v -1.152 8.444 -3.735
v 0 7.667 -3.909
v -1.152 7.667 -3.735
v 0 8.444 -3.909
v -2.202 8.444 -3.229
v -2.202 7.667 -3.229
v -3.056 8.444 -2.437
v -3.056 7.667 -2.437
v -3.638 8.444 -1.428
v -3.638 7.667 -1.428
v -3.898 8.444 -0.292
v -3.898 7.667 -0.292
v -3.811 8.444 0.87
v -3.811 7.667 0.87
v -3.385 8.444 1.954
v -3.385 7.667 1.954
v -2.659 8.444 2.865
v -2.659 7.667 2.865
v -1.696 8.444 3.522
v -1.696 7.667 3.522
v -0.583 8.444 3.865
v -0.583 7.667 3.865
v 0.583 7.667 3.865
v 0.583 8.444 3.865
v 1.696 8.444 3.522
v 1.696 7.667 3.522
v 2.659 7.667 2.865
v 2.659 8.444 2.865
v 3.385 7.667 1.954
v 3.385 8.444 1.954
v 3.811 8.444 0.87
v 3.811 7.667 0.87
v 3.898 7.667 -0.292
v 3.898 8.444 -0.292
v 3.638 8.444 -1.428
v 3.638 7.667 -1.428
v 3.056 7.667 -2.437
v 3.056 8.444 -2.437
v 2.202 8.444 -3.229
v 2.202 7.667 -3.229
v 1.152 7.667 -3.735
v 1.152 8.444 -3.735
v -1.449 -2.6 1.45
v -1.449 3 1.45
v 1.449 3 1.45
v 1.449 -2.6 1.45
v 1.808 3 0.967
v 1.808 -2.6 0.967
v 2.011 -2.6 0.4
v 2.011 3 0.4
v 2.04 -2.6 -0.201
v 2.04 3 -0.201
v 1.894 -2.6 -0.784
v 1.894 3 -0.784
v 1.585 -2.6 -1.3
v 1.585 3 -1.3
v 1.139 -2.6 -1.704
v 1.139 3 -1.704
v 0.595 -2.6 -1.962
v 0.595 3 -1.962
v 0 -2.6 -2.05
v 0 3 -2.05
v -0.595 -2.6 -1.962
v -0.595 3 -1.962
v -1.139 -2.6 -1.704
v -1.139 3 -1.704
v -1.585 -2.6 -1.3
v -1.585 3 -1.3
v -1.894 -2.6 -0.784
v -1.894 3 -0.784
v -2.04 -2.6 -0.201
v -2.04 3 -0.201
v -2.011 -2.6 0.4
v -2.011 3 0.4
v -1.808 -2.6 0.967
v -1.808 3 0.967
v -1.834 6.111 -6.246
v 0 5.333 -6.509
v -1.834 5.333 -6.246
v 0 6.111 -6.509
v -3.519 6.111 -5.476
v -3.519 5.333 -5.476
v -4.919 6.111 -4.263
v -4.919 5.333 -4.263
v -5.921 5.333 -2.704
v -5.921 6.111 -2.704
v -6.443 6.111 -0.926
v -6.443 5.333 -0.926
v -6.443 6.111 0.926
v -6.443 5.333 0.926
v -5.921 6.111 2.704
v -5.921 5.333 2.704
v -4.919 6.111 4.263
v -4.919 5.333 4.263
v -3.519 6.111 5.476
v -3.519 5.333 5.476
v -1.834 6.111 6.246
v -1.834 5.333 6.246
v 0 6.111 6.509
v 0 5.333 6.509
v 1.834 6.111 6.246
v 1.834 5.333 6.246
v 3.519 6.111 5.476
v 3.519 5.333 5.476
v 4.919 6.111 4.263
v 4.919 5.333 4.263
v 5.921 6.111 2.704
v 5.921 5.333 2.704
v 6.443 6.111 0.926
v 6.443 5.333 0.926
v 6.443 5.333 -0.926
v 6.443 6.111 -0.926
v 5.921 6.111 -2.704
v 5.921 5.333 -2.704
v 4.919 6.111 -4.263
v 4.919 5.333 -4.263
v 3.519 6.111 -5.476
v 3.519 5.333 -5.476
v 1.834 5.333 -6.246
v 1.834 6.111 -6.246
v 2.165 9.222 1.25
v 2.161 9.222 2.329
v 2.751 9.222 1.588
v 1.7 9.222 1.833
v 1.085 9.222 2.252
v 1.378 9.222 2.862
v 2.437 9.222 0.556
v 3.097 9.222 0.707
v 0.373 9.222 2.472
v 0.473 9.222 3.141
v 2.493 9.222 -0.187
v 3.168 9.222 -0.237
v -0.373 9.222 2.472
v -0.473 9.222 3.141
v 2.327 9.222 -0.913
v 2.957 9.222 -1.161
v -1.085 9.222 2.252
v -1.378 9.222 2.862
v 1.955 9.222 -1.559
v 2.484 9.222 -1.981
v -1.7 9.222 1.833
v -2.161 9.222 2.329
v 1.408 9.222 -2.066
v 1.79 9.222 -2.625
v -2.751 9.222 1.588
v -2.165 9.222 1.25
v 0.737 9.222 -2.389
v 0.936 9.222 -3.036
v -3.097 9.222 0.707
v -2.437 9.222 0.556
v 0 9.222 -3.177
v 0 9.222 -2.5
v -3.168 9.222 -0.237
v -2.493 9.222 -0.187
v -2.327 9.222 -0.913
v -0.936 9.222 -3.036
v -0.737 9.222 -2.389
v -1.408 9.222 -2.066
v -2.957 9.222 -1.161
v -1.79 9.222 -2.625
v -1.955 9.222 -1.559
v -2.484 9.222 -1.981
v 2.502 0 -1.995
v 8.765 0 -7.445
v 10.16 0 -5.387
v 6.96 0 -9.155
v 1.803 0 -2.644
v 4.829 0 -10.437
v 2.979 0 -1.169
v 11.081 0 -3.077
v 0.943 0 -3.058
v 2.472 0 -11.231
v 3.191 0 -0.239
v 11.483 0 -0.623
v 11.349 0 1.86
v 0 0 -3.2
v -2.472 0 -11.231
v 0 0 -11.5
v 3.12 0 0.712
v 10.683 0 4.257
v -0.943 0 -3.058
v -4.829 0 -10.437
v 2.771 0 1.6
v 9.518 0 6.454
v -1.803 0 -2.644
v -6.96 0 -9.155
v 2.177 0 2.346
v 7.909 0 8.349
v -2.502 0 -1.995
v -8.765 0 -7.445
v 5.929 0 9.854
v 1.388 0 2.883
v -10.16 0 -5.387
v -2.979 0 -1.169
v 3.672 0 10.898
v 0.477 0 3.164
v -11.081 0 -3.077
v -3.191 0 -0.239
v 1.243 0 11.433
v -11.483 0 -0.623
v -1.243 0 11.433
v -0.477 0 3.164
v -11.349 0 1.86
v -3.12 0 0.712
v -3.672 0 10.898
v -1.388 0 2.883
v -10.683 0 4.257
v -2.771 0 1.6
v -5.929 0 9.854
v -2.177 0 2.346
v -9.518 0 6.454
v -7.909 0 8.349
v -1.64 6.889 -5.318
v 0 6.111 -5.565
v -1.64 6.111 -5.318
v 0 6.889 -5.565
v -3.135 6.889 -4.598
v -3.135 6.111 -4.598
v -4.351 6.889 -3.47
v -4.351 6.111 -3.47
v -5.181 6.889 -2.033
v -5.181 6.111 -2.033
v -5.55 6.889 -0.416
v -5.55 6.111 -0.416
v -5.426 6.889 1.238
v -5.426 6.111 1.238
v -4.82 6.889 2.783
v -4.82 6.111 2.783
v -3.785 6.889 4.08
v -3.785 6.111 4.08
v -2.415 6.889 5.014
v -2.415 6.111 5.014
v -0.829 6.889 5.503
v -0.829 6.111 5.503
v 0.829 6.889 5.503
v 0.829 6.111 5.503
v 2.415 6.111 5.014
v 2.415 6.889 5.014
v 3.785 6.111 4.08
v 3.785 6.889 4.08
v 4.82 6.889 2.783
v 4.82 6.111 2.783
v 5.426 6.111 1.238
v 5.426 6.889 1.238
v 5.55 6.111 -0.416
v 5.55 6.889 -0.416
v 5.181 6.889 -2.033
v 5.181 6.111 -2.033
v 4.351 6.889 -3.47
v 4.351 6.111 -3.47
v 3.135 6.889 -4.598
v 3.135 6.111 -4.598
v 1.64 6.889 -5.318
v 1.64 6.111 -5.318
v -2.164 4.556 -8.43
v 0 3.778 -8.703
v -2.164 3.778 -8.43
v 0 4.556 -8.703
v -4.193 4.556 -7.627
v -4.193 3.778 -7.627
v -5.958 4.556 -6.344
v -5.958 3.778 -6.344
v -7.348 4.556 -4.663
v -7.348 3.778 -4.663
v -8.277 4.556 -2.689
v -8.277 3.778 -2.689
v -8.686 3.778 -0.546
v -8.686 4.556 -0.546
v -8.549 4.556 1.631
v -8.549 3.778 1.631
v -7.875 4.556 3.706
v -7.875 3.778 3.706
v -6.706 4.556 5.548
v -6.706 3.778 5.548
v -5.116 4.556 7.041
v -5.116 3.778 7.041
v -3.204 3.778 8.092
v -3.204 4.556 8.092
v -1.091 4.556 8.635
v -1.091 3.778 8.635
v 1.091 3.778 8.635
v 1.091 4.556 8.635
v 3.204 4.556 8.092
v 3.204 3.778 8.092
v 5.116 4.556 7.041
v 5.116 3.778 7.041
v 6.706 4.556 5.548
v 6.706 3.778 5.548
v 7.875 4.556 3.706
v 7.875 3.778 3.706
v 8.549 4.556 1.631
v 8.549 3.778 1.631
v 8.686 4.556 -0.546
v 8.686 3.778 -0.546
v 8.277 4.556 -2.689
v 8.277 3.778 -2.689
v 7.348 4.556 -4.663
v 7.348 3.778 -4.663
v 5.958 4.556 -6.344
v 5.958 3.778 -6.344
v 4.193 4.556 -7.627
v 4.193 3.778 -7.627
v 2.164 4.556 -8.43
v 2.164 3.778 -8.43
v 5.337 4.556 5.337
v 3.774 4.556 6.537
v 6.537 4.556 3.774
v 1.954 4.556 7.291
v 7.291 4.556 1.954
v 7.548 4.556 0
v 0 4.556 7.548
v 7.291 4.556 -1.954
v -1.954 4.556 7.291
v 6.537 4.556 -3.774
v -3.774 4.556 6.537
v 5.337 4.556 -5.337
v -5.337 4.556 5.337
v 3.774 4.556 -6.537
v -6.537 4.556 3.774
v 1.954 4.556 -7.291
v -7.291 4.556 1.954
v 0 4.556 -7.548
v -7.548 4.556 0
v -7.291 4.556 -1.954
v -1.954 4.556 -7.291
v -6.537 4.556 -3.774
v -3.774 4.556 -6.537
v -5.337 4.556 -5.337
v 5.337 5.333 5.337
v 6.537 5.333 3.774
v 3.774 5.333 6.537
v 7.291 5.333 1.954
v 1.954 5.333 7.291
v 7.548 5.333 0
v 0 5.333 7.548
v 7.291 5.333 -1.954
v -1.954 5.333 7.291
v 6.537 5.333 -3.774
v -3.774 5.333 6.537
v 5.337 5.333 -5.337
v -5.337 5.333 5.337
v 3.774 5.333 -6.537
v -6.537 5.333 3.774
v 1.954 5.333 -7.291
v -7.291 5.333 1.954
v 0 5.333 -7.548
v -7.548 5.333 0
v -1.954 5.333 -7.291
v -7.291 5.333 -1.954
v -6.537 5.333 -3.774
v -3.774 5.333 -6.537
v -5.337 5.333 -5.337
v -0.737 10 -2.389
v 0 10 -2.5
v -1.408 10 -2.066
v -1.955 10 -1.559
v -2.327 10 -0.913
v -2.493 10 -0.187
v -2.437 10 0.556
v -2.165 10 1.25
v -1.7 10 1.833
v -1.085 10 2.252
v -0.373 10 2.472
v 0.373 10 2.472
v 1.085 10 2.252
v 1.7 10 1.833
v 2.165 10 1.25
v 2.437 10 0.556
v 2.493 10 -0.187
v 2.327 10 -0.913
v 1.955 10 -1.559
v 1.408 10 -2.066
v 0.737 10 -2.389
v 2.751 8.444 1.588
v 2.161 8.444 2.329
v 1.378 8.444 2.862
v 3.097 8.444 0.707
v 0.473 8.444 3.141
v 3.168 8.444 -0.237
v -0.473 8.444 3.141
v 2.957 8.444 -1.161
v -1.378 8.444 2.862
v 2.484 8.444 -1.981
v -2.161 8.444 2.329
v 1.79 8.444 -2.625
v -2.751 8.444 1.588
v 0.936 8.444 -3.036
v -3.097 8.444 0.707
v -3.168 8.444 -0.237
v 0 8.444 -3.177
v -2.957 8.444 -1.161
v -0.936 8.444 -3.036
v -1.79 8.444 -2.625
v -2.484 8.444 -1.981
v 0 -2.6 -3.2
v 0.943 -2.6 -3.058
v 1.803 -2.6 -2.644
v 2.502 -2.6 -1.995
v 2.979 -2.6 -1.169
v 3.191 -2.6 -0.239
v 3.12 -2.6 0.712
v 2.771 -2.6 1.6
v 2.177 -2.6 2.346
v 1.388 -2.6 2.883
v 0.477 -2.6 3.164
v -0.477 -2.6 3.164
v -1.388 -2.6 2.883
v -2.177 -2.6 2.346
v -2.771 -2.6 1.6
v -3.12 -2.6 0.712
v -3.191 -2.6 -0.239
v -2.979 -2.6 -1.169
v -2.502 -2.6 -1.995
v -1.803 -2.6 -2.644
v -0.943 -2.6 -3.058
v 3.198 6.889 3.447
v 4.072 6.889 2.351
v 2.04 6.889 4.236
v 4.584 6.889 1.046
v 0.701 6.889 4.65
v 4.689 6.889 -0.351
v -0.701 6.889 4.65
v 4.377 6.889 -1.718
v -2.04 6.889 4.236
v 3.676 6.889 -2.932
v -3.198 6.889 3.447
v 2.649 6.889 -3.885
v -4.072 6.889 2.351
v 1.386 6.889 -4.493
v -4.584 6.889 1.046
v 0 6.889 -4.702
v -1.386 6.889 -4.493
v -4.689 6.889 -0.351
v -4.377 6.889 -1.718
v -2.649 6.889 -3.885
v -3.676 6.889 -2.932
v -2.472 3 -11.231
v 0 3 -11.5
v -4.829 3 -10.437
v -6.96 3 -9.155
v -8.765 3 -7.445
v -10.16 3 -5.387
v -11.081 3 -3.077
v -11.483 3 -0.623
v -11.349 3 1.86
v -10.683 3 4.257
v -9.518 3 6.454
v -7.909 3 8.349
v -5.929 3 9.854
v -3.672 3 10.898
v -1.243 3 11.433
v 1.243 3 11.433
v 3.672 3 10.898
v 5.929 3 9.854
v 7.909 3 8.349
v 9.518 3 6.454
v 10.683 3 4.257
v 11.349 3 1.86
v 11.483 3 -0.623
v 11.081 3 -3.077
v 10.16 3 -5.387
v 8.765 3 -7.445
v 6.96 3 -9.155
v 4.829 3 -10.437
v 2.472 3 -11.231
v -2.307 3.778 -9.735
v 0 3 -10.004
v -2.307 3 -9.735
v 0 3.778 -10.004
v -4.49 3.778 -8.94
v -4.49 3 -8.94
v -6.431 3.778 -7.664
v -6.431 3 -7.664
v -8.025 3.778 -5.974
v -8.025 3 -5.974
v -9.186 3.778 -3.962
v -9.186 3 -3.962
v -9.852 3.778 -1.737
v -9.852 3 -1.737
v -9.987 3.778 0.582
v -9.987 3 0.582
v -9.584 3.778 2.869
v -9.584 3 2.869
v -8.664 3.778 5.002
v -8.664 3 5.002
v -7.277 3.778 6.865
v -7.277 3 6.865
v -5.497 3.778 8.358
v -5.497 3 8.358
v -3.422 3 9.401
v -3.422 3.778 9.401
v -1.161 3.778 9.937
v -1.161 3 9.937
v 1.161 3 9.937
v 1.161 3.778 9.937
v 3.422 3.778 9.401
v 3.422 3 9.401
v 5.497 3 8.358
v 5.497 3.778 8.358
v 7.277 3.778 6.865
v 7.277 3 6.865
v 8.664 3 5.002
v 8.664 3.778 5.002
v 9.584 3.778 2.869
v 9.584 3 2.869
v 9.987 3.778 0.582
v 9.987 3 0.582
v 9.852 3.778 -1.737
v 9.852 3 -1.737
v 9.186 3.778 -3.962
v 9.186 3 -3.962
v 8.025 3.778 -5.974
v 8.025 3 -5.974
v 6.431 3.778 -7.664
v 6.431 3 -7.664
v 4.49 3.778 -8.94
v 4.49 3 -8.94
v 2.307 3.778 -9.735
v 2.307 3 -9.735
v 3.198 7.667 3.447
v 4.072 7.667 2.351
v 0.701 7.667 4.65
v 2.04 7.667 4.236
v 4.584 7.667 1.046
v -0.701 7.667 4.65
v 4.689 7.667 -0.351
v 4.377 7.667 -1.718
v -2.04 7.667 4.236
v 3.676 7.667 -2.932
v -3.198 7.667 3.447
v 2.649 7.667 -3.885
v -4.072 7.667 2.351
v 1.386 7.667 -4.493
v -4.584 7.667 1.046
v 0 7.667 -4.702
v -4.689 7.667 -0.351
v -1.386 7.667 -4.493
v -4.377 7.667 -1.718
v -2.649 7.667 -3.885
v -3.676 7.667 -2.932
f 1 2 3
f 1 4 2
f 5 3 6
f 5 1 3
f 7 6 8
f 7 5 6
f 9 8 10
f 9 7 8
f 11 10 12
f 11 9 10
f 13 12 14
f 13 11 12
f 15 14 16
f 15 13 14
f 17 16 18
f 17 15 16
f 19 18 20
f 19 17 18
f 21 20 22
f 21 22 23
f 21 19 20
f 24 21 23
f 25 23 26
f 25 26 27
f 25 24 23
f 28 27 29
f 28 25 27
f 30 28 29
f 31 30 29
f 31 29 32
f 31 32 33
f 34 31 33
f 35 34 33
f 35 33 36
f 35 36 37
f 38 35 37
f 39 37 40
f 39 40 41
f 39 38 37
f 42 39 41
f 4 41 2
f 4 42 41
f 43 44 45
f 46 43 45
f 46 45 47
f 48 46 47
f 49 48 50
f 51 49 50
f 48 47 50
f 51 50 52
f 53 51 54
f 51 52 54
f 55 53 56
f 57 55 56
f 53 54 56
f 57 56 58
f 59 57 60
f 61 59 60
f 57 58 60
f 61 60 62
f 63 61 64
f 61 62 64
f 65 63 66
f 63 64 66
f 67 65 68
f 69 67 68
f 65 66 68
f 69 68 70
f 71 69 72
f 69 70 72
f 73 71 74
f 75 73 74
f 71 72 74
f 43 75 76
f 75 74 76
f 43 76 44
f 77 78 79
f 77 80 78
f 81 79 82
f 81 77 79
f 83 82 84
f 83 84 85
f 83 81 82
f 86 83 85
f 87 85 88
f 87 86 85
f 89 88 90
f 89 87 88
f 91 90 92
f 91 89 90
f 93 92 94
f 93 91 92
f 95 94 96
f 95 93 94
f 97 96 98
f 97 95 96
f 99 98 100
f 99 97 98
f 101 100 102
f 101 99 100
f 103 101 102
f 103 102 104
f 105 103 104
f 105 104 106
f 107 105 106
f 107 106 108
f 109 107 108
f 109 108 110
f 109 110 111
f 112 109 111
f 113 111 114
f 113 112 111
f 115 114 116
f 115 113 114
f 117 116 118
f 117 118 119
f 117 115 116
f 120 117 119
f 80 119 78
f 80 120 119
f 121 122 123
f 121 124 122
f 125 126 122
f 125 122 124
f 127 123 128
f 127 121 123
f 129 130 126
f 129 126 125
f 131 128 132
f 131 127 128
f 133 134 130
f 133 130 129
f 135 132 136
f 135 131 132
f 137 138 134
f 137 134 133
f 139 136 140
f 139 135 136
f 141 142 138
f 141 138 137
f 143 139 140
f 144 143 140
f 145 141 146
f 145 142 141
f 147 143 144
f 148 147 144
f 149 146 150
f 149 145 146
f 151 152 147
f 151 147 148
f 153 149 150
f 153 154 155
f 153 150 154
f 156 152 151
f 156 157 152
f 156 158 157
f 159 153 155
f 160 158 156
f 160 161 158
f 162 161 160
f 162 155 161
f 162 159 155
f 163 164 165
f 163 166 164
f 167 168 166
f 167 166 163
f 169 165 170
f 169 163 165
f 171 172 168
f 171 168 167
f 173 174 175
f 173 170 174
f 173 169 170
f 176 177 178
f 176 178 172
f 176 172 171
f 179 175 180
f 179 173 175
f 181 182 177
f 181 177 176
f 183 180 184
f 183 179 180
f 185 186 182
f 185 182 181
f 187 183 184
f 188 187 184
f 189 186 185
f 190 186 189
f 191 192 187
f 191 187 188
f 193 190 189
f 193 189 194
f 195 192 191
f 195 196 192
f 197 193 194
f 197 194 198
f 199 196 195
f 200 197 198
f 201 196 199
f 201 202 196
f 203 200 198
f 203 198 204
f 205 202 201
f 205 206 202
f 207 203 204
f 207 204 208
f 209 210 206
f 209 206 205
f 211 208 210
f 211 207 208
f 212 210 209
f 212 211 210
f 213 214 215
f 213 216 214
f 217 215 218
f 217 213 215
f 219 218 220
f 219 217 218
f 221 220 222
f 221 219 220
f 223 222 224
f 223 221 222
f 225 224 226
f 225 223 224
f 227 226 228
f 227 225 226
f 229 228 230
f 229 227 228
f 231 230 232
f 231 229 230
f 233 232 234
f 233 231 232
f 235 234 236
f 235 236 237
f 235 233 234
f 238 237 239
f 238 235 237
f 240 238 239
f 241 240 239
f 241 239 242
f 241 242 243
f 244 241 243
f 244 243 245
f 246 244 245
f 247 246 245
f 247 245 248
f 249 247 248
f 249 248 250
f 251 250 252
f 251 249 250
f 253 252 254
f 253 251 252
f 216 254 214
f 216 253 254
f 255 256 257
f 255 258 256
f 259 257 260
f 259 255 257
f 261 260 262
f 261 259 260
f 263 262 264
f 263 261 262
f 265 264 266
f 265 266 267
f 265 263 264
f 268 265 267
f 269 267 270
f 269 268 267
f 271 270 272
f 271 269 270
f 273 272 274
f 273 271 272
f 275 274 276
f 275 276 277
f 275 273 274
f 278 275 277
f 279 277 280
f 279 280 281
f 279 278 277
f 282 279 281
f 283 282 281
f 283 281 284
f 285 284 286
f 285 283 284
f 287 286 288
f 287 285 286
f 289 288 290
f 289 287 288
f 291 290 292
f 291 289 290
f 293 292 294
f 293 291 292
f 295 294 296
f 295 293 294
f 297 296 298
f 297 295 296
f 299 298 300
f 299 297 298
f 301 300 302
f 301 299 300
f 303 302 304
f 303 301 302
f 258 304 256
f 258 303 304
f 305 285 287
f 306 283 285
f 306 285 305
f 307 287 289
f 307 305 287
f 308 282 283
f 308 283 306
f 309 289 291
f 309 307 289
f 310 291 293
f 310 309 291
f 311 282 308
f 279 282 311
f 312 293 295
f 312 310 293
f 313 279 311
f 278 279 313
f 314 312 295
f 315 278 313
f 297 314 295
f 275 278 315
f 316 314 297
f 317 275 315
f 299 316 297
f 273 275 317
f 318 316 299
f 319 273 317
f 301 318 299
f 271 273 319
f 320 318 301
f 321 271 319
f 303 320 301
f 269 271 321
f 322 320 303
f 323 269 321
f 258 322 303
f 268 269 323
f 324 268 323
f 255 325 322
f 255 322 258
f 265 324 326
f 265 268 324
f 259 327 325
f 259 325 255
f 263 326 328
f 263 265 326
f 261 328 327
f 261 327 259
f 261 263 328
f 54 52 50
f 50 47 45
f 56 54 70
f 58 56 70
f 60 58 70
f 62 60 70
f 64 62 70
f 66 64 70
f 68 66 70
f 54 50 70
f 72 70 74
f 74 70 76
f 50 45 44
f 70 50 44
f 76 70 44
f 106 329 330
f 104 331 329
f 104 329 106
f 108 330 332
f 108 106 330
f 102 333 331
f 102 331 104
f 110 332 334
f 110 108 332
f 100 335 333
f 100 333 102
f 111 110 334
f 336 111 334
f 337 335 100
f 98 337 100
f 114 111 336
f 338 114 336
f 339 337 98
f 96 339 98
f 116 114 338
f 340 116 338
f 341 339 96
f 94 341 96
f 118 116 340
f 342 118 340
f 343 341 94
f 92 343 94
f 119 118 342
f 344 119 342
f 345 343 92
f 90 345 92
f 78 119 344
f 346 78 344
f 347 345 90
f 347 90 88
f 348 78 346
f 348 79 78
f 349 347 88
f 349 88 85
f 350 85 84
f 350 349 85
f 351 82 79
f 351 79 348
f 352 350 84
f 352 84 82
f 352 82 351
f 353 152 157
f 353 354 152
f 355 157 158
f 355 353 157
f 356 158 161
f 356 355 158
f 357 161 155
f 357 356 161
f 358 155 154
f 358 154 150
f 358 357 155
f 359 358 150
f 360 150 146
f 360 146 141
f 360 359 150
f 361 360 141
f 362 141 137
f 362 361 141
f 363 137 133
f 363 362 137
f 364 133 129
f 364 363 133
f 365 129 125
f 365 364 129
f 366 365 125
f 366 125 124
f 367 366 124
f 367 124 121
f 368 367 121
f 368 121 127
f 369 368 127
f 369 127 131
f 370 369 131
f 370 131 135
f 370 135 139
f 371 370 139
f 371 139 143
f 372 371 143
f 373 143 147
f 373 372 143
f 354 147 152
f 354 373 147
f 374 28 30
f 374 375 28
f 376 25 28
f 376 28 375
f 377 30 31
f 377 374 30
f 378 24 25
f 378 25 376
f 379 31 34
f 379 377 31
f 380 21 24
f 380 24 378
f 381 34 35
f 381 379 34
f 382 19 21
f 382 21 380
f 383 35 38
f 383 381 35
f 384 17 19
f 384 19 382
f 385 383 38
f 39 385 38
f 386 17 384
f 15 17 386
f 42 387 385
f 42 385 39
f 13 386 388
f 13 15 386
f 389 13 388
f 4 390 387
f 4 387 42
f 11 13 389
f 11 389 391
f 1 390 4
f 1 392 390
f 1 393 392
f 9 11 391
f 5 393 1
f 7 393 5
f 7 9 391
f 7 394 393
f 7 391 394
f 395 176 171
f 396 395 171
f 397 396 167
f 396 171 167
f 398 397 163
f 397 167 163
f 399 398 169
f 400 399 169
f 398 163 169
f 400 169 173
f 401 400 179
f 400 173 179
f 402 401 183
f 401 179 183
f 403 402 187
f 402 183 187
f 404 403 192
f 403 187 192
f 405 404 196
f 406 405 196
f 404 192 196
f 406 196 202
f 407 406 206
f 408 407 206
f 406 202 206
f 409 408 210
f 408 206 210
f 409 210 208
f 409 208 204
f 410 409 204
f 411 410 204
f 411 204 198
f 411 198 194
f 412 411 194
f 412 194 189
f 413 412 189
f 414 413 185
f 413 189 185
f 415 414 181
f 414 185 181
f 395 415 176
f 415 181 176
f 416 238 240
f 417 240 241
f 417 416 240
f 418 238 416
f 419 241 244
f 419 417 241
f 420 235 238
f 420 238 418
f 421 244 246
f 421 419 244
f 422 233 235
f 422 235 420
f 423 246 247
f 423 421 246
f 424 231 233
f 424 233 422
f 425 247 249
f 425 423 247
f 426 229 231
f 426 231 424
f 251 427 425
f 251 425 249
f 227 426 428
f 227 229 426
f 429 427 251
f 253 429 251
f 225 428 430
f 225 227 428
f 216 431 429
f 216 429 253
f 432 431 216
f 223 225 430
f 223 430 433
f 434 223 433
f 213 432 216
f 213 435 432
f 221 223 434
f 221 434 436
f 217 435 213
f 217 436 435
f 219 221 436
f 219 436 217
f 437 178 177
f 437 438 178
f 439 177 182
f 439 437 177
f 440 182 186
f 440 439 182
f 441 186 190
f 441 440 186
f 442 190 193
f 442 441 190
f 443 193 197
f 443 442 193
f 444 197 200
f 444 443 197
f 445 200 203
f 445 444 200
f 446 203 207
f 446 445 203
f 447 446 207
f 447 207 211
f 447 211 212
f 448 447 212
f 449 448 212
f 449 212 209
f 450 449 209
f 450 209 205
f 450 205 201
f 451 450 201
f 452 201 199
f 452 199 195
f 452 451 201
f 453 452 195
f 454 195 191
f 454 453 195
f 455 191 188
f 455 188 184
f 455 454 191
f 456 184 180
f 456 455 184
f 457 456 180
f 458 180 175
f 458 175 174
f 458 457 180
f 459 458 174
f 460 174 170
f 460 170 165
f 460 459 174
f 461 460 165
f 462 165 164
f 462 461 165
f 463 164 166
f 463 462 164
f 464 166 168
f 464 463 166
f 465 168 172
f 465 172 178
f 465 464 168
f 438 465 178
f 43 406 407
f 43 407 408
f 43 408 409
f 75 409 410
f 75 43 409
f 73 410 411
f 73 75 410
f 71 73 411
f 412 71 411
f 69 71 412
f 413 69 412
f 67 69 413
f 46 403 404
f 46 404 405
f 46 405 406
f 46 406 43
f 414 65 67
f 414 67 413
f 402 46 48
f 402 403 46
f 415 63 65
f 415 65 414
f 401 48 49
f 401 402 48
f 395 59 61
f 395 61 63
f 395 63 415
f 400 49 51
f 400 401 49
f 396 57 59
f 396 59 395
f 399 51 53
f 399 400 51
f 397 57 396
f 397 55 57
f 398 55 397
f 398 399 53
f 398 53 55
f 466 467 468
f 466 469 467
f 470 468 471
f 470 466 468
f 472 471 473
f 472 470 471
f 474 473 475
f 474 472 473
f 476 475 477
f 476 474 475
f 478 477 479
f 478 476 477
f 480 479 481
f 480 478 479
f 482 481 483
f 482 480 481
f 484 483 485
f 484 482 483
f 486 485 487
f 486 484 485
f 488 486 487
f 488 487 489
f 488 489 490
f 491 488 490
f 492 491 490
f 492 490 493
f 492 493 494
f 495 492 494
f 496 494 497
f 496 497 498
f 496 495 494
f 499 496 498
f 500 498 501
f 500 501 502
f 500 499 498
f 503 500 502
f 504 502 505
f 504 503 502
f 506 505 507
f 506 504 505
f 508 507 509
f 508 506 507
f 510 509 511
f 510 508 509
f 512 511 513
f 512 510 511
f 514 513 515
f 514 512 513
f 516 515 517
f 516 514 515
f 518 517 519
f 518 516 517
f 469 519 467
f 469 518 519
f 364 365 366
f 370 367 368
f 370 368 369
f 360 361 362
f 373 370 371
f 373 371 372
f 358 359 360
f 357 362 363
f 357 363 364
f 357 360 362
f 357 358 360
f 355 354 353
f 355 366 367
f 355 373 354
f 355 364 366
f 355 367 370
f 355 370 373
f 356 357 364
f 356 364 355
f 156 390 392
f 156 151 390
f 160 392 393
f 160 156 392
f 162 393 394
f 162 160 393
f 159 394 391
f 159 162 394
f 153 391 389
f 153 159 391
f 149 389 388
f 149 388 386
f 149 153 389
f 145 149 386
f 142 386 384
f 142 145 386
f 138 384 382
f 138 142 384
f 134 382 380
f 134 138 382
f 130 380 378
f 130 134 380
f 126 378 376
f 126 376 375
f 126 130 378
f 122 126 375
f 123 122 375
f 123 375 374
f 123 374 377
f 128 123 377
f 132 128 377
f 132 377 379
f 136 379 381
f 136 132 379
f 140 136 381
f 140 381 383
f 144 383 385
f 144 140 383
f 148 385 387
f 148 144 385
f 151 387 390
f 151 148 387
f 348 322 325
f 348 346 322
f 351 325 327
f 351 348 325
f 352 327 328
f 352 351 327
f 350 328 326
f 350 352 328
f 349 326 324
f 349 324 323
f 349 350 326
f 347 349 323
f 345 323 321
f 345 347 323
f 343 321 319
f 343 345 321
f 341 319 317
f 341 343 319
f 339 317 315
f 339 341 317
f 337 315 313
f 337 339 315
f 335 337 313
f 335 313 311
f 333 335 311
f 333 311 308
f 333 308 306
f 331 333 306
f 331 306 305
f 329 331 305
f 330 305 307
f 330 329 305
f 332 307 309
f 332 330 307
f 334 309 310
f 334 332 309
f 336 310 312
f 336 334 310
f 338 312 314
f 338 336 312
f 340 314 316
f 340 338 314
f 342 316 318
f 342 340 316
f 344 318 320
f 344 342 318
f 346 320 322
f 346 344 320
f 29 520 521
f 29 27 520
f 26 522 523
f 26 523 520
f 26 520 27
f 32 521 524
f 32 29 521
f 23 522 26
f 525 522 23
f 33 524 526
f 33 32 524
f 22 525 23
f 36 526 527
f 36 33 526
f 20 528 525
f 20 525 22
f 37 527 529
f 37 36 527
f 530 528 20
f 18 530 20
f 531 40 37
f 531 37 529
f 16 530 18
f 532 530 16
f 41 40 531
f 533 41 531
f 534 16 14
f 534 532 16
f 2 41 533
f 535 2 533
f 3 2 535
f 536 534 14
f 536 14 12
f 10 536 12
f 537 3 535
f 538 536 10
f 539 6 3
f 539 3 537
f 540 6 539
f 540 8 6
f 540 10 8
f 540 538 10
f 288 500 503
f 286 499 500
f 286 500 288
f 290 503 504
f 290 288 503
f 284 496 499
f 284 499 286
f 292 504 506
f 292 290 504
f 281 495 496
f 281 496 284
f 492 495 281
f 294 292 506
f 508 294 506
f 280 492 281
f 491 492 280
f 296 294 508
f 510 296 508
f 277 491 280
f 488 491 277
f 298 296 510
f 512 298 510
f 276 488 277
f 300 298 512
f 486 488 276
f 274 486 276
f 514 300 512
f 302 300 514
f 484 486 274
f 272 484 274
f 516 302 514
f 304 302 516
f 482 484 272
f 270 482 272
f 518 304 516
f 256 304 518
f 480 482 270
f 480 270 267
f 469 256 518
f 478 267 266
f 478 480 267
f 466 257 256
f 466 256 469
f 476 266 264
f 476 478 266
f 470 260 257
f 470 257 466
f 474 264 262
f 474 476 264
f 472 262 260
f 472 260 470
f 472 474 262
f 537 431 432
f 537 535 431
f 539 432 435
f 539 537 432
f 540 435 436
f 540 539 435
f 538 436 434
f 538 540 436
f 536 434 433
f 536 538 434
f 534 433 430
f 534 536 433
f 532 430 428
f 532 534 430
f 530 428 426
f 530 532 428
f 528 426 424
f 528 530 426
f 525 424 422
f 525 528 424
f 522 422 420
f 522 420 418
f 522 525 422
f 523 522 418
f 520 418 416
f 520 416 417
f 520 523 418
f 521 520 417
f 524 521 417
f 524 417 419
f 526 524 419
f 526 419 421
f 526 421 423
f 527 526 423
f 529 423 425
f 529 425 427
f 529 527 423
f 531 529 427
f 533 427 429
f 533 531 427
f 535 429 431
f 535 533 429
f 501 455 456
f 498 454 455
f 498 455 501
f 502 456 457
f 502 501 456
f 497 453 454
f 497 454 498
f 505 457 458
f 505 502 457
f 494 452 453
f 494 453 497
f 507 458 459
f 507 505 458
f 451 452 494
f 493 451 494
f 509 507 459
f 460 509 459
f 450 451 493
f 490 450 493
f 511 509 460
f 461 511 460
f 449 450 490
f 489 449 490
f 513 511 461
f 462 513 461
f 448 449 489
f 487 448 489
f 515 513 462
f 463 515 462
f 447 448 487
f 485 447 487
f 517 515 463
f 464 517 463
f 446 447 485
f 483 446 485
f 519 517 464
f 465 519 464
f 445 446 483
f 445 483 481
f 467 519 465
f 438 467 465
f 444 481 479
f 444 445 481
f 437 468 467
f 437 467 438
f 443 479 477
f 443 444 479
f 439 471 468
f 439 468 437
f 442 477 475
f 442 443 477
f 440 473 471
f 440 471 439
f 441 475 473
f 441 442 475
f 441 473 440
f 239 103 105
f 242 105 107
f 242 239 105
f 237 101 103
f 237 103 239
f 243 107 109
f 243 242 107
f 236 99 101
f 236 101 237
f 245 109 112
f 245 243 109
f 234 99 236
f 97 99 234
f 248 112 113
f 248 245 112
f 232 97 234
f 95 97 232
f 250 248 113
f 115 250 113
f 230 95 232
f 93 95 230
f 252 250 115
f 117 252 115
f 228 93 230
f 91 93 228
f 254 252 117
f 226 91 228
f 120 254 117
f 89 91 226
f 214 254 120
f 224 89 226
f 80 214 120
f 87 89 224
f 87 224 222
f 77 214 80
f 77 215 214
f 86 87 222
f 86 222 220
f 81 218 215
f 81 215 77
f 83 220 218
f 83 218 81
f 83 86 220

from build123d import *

# Parameters (mm, degrees)
SKETCH2_R               = 3.2
BOSS_EXTRUDE1_DEPTH     = 2.6
CUT_EXTRUDE1_DEPTH      = 3
CUT_EXTRUDE1_DEPTH_BACK = 3


with BuildPart() as part:
    # Sketch1 → Revolve1 (revolve)
    with BuildSketch(Plane(origin=(0, 0, 0), x_dir=(0, 0, -1), z_dir=(1, 0, 0))):
        Polygon((-11.5, 0), (-11.5, 3), (-10.00428681, 3), (-10.00428681, 3.777777778), (-8.703281017, 3.777777778), (-8.703281017, 4.555555556), (-7.548361646, 4.555555556), (-7.548361646, 5.333333333), (-6.509180682, 5.333333333), (-6.509180682, 6.111111111), (-5.565268632, 6.111111111), (-5.565268632, 6.888888889), (-4.702037743, 6.888888889), (-4.702037743, 7.666666667), (-3.908655746, 7.666666667), (-3.908655746, 8.444444444), (-3.176819128, 8.444444444), (-3.176819128, 9.222222222), (-2.5, 9.222222222), (-2.5, 10), (0, 10), (0, 0), align=None)
    revolve(axis=Axis((0, 0, 0), (0, 1, 0)))

    # Sketch2 → Boss-Extrude1 (add)
    with BuildSketch(Plane.XZ):
        Circle(SKETCH2_R)
    extrude(amount=BOSS_EXTRUDE1_DEPTH)

    # Sketch2<3> → Cut-Extrude1 (cut, two sides: drawn at the far end of the back side and taken through both)
    with BuildSketch(Plane.XZ.offset(-CUT_EXTRUDE1_DEPTH_BACK)):
        with BuildLine():
            Line((-1.449137675, 1.45), (1.449137675, 1.45))
            ThreePointArc((1.449137675, 1.45), (0, -2.05), (-1.449137675, 1.45))
        make_face()
    extrude(amount=CUT_EXTRUDE1_DEPTH + CUT_EXTRUDE1_DEPTH_BACK, mode=Mode.SUBTRACT)


solid = part.part
